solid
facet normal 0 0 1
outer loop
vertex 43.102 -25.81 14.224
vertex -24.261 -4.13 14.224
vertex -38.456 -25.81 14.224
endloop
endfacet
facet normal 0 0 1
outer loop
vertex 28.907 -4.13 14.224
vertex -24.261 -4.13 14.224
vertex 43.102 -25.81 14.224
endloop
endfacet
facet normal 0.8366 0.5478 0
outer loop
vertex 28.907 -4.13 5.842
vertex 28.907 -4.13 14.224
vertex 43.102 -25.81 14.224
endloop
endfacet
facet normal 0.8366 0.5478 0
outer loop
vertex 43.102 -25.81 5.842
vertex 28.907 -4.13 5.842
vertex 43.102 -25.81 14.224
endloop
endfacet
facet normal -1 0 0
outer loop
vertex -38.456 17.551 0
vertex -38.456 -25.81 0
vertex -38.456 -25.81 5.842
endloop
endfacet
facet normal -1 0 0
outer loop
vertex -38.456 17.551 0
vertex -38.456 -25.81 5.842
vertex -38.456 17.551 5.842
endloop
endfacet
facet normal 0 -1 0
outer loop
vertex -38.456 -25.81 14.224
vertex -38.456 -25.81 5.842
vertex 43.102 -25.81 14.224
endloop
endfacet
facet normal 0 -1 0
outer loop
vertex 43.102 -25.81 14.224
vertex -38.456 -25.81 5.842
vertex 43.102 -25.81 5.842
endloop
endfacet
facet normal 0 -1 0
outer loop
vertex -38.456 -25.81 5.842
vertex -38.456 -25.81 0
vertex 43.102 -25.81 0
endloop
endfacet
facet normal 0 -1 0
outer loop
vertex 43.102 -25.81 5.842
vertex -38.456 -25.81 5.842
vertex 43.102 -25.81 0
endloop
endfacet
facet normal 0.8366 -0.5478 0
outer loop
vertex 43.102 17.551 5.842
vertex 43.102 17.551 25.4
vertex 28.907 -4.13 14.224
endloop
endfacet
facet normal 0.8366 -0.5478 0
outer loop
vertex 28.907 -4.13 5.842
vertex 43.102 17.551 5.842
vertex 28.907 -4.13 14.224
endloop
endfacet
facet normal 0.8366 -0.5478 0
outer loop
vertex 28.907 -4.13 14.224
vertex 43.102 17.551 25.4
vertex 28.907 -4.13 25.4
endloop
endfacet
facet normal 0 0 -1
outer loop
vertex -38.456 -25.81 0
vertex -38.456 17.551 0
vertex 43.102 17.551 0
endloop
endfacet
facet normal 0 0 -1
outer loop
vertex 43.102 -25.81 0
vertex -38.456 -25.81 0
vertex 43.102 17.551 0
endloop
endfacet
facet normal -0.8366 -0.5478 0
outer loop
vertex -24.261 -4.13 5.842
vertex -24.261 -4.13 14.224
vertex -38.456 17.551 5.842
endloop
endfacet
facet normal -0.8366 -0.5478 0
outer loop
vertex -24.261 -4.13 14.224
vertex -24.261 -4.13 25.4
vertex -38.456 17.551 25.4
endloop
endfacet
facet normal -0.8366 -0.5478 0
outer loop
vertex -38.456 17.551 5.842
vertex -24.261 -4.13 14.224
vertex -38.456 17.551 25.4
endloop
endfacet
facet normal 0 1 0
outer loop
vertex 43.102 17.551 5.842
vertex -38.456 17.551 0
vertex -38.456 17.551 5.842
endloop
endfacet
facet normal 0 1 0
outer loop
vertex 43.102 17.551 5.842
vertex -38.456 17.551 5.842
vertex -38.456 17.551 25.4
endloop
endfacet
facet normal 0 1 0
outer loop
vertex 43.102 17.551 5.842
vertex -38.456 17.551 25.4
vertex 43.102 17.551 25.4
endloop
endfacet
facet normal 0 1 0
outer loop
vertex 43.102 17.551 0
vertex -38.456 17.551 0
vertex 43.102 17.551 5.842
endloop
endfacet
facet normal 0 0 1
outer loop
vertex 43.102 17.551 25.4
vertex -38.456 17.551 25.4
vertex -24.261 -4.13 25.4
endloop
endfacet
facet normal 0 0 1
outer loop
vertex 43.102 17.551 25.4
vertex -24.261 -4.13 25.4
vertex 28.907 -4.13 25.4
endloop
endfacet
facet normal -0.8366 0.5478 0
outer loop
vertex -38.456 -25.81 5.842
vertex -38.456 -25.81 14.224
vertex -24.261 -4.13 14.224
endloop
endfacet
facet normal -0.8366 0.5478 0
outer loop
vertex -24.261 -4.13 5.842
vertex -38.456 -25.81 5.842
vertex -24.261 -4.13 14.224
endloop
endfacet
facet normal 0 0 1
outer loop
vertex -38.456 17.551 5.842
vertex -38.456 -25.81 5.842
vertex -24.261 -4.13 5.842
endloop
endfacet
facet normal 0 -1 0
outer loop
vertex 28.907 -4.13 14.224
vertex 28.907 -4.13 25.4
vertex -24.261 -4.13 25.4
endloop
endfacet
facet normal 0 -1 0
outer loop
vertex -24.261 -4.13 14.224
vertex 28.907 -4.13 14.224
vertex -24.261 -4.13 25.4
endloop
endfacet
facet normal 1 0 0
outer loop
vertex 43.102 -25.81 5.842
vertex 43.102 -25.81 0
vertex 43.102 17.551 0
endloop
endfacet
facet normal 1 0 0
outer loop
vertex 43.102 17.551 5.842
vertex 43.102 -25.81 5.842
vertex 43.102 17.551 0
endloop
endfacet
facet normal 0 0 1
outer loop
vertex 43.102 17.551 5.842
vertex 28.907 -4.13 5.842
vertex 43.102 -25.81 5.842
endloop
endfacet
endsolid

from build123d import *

# Parameters (mm, degrees)
F0_W     = 81.5585851669
F0_H     = 43.3602575213
F1_DEPTH = 25.4
F3_DEPTH = 19.558
F5_DEPTH = 11.176


with BuildPart() as f1:
    # F0 (on Top) → F1 (new body)
    with BuildSketch(Plane.XY):
        with Locations((2.322871238, -4.1295485571)):
            Rectangle(F0_W, F0_H)
    extrude(amount=F1_DEPTH)

    # F2 (on face) → F3 (cut)
    with BuildSketch(Plane.XY.offset(25.4)):
        Polygon((-24.2610964924, -4.1295485571), (-38.4564213455, 17.5505802035), (-38.4564213455, -25.8096773177), align=None)
        Polygon((43.1021638215, -25.8096773177), (43.1021638215, 17.5505802035), (28.906840831, -4.1295485571), align=None)
    extrude(amount=-F3_DEPTH, mode=Mode.SUBTRACT)

    # F4 (on face) → F5 (cut)
    with BuildSketch(Plane.XY.offset(25.4)):
        Polygon((-24.2610964924, -4.1295485571), (-38.4564213455, -25.8096773177), (43.1021638215, -25.8096773177), (28.906840831, -4.1295485571), align=None)
    extrude(amount=-F5_DEPTH, mode=Mode.SUBTRACT)


solid = f1.part
